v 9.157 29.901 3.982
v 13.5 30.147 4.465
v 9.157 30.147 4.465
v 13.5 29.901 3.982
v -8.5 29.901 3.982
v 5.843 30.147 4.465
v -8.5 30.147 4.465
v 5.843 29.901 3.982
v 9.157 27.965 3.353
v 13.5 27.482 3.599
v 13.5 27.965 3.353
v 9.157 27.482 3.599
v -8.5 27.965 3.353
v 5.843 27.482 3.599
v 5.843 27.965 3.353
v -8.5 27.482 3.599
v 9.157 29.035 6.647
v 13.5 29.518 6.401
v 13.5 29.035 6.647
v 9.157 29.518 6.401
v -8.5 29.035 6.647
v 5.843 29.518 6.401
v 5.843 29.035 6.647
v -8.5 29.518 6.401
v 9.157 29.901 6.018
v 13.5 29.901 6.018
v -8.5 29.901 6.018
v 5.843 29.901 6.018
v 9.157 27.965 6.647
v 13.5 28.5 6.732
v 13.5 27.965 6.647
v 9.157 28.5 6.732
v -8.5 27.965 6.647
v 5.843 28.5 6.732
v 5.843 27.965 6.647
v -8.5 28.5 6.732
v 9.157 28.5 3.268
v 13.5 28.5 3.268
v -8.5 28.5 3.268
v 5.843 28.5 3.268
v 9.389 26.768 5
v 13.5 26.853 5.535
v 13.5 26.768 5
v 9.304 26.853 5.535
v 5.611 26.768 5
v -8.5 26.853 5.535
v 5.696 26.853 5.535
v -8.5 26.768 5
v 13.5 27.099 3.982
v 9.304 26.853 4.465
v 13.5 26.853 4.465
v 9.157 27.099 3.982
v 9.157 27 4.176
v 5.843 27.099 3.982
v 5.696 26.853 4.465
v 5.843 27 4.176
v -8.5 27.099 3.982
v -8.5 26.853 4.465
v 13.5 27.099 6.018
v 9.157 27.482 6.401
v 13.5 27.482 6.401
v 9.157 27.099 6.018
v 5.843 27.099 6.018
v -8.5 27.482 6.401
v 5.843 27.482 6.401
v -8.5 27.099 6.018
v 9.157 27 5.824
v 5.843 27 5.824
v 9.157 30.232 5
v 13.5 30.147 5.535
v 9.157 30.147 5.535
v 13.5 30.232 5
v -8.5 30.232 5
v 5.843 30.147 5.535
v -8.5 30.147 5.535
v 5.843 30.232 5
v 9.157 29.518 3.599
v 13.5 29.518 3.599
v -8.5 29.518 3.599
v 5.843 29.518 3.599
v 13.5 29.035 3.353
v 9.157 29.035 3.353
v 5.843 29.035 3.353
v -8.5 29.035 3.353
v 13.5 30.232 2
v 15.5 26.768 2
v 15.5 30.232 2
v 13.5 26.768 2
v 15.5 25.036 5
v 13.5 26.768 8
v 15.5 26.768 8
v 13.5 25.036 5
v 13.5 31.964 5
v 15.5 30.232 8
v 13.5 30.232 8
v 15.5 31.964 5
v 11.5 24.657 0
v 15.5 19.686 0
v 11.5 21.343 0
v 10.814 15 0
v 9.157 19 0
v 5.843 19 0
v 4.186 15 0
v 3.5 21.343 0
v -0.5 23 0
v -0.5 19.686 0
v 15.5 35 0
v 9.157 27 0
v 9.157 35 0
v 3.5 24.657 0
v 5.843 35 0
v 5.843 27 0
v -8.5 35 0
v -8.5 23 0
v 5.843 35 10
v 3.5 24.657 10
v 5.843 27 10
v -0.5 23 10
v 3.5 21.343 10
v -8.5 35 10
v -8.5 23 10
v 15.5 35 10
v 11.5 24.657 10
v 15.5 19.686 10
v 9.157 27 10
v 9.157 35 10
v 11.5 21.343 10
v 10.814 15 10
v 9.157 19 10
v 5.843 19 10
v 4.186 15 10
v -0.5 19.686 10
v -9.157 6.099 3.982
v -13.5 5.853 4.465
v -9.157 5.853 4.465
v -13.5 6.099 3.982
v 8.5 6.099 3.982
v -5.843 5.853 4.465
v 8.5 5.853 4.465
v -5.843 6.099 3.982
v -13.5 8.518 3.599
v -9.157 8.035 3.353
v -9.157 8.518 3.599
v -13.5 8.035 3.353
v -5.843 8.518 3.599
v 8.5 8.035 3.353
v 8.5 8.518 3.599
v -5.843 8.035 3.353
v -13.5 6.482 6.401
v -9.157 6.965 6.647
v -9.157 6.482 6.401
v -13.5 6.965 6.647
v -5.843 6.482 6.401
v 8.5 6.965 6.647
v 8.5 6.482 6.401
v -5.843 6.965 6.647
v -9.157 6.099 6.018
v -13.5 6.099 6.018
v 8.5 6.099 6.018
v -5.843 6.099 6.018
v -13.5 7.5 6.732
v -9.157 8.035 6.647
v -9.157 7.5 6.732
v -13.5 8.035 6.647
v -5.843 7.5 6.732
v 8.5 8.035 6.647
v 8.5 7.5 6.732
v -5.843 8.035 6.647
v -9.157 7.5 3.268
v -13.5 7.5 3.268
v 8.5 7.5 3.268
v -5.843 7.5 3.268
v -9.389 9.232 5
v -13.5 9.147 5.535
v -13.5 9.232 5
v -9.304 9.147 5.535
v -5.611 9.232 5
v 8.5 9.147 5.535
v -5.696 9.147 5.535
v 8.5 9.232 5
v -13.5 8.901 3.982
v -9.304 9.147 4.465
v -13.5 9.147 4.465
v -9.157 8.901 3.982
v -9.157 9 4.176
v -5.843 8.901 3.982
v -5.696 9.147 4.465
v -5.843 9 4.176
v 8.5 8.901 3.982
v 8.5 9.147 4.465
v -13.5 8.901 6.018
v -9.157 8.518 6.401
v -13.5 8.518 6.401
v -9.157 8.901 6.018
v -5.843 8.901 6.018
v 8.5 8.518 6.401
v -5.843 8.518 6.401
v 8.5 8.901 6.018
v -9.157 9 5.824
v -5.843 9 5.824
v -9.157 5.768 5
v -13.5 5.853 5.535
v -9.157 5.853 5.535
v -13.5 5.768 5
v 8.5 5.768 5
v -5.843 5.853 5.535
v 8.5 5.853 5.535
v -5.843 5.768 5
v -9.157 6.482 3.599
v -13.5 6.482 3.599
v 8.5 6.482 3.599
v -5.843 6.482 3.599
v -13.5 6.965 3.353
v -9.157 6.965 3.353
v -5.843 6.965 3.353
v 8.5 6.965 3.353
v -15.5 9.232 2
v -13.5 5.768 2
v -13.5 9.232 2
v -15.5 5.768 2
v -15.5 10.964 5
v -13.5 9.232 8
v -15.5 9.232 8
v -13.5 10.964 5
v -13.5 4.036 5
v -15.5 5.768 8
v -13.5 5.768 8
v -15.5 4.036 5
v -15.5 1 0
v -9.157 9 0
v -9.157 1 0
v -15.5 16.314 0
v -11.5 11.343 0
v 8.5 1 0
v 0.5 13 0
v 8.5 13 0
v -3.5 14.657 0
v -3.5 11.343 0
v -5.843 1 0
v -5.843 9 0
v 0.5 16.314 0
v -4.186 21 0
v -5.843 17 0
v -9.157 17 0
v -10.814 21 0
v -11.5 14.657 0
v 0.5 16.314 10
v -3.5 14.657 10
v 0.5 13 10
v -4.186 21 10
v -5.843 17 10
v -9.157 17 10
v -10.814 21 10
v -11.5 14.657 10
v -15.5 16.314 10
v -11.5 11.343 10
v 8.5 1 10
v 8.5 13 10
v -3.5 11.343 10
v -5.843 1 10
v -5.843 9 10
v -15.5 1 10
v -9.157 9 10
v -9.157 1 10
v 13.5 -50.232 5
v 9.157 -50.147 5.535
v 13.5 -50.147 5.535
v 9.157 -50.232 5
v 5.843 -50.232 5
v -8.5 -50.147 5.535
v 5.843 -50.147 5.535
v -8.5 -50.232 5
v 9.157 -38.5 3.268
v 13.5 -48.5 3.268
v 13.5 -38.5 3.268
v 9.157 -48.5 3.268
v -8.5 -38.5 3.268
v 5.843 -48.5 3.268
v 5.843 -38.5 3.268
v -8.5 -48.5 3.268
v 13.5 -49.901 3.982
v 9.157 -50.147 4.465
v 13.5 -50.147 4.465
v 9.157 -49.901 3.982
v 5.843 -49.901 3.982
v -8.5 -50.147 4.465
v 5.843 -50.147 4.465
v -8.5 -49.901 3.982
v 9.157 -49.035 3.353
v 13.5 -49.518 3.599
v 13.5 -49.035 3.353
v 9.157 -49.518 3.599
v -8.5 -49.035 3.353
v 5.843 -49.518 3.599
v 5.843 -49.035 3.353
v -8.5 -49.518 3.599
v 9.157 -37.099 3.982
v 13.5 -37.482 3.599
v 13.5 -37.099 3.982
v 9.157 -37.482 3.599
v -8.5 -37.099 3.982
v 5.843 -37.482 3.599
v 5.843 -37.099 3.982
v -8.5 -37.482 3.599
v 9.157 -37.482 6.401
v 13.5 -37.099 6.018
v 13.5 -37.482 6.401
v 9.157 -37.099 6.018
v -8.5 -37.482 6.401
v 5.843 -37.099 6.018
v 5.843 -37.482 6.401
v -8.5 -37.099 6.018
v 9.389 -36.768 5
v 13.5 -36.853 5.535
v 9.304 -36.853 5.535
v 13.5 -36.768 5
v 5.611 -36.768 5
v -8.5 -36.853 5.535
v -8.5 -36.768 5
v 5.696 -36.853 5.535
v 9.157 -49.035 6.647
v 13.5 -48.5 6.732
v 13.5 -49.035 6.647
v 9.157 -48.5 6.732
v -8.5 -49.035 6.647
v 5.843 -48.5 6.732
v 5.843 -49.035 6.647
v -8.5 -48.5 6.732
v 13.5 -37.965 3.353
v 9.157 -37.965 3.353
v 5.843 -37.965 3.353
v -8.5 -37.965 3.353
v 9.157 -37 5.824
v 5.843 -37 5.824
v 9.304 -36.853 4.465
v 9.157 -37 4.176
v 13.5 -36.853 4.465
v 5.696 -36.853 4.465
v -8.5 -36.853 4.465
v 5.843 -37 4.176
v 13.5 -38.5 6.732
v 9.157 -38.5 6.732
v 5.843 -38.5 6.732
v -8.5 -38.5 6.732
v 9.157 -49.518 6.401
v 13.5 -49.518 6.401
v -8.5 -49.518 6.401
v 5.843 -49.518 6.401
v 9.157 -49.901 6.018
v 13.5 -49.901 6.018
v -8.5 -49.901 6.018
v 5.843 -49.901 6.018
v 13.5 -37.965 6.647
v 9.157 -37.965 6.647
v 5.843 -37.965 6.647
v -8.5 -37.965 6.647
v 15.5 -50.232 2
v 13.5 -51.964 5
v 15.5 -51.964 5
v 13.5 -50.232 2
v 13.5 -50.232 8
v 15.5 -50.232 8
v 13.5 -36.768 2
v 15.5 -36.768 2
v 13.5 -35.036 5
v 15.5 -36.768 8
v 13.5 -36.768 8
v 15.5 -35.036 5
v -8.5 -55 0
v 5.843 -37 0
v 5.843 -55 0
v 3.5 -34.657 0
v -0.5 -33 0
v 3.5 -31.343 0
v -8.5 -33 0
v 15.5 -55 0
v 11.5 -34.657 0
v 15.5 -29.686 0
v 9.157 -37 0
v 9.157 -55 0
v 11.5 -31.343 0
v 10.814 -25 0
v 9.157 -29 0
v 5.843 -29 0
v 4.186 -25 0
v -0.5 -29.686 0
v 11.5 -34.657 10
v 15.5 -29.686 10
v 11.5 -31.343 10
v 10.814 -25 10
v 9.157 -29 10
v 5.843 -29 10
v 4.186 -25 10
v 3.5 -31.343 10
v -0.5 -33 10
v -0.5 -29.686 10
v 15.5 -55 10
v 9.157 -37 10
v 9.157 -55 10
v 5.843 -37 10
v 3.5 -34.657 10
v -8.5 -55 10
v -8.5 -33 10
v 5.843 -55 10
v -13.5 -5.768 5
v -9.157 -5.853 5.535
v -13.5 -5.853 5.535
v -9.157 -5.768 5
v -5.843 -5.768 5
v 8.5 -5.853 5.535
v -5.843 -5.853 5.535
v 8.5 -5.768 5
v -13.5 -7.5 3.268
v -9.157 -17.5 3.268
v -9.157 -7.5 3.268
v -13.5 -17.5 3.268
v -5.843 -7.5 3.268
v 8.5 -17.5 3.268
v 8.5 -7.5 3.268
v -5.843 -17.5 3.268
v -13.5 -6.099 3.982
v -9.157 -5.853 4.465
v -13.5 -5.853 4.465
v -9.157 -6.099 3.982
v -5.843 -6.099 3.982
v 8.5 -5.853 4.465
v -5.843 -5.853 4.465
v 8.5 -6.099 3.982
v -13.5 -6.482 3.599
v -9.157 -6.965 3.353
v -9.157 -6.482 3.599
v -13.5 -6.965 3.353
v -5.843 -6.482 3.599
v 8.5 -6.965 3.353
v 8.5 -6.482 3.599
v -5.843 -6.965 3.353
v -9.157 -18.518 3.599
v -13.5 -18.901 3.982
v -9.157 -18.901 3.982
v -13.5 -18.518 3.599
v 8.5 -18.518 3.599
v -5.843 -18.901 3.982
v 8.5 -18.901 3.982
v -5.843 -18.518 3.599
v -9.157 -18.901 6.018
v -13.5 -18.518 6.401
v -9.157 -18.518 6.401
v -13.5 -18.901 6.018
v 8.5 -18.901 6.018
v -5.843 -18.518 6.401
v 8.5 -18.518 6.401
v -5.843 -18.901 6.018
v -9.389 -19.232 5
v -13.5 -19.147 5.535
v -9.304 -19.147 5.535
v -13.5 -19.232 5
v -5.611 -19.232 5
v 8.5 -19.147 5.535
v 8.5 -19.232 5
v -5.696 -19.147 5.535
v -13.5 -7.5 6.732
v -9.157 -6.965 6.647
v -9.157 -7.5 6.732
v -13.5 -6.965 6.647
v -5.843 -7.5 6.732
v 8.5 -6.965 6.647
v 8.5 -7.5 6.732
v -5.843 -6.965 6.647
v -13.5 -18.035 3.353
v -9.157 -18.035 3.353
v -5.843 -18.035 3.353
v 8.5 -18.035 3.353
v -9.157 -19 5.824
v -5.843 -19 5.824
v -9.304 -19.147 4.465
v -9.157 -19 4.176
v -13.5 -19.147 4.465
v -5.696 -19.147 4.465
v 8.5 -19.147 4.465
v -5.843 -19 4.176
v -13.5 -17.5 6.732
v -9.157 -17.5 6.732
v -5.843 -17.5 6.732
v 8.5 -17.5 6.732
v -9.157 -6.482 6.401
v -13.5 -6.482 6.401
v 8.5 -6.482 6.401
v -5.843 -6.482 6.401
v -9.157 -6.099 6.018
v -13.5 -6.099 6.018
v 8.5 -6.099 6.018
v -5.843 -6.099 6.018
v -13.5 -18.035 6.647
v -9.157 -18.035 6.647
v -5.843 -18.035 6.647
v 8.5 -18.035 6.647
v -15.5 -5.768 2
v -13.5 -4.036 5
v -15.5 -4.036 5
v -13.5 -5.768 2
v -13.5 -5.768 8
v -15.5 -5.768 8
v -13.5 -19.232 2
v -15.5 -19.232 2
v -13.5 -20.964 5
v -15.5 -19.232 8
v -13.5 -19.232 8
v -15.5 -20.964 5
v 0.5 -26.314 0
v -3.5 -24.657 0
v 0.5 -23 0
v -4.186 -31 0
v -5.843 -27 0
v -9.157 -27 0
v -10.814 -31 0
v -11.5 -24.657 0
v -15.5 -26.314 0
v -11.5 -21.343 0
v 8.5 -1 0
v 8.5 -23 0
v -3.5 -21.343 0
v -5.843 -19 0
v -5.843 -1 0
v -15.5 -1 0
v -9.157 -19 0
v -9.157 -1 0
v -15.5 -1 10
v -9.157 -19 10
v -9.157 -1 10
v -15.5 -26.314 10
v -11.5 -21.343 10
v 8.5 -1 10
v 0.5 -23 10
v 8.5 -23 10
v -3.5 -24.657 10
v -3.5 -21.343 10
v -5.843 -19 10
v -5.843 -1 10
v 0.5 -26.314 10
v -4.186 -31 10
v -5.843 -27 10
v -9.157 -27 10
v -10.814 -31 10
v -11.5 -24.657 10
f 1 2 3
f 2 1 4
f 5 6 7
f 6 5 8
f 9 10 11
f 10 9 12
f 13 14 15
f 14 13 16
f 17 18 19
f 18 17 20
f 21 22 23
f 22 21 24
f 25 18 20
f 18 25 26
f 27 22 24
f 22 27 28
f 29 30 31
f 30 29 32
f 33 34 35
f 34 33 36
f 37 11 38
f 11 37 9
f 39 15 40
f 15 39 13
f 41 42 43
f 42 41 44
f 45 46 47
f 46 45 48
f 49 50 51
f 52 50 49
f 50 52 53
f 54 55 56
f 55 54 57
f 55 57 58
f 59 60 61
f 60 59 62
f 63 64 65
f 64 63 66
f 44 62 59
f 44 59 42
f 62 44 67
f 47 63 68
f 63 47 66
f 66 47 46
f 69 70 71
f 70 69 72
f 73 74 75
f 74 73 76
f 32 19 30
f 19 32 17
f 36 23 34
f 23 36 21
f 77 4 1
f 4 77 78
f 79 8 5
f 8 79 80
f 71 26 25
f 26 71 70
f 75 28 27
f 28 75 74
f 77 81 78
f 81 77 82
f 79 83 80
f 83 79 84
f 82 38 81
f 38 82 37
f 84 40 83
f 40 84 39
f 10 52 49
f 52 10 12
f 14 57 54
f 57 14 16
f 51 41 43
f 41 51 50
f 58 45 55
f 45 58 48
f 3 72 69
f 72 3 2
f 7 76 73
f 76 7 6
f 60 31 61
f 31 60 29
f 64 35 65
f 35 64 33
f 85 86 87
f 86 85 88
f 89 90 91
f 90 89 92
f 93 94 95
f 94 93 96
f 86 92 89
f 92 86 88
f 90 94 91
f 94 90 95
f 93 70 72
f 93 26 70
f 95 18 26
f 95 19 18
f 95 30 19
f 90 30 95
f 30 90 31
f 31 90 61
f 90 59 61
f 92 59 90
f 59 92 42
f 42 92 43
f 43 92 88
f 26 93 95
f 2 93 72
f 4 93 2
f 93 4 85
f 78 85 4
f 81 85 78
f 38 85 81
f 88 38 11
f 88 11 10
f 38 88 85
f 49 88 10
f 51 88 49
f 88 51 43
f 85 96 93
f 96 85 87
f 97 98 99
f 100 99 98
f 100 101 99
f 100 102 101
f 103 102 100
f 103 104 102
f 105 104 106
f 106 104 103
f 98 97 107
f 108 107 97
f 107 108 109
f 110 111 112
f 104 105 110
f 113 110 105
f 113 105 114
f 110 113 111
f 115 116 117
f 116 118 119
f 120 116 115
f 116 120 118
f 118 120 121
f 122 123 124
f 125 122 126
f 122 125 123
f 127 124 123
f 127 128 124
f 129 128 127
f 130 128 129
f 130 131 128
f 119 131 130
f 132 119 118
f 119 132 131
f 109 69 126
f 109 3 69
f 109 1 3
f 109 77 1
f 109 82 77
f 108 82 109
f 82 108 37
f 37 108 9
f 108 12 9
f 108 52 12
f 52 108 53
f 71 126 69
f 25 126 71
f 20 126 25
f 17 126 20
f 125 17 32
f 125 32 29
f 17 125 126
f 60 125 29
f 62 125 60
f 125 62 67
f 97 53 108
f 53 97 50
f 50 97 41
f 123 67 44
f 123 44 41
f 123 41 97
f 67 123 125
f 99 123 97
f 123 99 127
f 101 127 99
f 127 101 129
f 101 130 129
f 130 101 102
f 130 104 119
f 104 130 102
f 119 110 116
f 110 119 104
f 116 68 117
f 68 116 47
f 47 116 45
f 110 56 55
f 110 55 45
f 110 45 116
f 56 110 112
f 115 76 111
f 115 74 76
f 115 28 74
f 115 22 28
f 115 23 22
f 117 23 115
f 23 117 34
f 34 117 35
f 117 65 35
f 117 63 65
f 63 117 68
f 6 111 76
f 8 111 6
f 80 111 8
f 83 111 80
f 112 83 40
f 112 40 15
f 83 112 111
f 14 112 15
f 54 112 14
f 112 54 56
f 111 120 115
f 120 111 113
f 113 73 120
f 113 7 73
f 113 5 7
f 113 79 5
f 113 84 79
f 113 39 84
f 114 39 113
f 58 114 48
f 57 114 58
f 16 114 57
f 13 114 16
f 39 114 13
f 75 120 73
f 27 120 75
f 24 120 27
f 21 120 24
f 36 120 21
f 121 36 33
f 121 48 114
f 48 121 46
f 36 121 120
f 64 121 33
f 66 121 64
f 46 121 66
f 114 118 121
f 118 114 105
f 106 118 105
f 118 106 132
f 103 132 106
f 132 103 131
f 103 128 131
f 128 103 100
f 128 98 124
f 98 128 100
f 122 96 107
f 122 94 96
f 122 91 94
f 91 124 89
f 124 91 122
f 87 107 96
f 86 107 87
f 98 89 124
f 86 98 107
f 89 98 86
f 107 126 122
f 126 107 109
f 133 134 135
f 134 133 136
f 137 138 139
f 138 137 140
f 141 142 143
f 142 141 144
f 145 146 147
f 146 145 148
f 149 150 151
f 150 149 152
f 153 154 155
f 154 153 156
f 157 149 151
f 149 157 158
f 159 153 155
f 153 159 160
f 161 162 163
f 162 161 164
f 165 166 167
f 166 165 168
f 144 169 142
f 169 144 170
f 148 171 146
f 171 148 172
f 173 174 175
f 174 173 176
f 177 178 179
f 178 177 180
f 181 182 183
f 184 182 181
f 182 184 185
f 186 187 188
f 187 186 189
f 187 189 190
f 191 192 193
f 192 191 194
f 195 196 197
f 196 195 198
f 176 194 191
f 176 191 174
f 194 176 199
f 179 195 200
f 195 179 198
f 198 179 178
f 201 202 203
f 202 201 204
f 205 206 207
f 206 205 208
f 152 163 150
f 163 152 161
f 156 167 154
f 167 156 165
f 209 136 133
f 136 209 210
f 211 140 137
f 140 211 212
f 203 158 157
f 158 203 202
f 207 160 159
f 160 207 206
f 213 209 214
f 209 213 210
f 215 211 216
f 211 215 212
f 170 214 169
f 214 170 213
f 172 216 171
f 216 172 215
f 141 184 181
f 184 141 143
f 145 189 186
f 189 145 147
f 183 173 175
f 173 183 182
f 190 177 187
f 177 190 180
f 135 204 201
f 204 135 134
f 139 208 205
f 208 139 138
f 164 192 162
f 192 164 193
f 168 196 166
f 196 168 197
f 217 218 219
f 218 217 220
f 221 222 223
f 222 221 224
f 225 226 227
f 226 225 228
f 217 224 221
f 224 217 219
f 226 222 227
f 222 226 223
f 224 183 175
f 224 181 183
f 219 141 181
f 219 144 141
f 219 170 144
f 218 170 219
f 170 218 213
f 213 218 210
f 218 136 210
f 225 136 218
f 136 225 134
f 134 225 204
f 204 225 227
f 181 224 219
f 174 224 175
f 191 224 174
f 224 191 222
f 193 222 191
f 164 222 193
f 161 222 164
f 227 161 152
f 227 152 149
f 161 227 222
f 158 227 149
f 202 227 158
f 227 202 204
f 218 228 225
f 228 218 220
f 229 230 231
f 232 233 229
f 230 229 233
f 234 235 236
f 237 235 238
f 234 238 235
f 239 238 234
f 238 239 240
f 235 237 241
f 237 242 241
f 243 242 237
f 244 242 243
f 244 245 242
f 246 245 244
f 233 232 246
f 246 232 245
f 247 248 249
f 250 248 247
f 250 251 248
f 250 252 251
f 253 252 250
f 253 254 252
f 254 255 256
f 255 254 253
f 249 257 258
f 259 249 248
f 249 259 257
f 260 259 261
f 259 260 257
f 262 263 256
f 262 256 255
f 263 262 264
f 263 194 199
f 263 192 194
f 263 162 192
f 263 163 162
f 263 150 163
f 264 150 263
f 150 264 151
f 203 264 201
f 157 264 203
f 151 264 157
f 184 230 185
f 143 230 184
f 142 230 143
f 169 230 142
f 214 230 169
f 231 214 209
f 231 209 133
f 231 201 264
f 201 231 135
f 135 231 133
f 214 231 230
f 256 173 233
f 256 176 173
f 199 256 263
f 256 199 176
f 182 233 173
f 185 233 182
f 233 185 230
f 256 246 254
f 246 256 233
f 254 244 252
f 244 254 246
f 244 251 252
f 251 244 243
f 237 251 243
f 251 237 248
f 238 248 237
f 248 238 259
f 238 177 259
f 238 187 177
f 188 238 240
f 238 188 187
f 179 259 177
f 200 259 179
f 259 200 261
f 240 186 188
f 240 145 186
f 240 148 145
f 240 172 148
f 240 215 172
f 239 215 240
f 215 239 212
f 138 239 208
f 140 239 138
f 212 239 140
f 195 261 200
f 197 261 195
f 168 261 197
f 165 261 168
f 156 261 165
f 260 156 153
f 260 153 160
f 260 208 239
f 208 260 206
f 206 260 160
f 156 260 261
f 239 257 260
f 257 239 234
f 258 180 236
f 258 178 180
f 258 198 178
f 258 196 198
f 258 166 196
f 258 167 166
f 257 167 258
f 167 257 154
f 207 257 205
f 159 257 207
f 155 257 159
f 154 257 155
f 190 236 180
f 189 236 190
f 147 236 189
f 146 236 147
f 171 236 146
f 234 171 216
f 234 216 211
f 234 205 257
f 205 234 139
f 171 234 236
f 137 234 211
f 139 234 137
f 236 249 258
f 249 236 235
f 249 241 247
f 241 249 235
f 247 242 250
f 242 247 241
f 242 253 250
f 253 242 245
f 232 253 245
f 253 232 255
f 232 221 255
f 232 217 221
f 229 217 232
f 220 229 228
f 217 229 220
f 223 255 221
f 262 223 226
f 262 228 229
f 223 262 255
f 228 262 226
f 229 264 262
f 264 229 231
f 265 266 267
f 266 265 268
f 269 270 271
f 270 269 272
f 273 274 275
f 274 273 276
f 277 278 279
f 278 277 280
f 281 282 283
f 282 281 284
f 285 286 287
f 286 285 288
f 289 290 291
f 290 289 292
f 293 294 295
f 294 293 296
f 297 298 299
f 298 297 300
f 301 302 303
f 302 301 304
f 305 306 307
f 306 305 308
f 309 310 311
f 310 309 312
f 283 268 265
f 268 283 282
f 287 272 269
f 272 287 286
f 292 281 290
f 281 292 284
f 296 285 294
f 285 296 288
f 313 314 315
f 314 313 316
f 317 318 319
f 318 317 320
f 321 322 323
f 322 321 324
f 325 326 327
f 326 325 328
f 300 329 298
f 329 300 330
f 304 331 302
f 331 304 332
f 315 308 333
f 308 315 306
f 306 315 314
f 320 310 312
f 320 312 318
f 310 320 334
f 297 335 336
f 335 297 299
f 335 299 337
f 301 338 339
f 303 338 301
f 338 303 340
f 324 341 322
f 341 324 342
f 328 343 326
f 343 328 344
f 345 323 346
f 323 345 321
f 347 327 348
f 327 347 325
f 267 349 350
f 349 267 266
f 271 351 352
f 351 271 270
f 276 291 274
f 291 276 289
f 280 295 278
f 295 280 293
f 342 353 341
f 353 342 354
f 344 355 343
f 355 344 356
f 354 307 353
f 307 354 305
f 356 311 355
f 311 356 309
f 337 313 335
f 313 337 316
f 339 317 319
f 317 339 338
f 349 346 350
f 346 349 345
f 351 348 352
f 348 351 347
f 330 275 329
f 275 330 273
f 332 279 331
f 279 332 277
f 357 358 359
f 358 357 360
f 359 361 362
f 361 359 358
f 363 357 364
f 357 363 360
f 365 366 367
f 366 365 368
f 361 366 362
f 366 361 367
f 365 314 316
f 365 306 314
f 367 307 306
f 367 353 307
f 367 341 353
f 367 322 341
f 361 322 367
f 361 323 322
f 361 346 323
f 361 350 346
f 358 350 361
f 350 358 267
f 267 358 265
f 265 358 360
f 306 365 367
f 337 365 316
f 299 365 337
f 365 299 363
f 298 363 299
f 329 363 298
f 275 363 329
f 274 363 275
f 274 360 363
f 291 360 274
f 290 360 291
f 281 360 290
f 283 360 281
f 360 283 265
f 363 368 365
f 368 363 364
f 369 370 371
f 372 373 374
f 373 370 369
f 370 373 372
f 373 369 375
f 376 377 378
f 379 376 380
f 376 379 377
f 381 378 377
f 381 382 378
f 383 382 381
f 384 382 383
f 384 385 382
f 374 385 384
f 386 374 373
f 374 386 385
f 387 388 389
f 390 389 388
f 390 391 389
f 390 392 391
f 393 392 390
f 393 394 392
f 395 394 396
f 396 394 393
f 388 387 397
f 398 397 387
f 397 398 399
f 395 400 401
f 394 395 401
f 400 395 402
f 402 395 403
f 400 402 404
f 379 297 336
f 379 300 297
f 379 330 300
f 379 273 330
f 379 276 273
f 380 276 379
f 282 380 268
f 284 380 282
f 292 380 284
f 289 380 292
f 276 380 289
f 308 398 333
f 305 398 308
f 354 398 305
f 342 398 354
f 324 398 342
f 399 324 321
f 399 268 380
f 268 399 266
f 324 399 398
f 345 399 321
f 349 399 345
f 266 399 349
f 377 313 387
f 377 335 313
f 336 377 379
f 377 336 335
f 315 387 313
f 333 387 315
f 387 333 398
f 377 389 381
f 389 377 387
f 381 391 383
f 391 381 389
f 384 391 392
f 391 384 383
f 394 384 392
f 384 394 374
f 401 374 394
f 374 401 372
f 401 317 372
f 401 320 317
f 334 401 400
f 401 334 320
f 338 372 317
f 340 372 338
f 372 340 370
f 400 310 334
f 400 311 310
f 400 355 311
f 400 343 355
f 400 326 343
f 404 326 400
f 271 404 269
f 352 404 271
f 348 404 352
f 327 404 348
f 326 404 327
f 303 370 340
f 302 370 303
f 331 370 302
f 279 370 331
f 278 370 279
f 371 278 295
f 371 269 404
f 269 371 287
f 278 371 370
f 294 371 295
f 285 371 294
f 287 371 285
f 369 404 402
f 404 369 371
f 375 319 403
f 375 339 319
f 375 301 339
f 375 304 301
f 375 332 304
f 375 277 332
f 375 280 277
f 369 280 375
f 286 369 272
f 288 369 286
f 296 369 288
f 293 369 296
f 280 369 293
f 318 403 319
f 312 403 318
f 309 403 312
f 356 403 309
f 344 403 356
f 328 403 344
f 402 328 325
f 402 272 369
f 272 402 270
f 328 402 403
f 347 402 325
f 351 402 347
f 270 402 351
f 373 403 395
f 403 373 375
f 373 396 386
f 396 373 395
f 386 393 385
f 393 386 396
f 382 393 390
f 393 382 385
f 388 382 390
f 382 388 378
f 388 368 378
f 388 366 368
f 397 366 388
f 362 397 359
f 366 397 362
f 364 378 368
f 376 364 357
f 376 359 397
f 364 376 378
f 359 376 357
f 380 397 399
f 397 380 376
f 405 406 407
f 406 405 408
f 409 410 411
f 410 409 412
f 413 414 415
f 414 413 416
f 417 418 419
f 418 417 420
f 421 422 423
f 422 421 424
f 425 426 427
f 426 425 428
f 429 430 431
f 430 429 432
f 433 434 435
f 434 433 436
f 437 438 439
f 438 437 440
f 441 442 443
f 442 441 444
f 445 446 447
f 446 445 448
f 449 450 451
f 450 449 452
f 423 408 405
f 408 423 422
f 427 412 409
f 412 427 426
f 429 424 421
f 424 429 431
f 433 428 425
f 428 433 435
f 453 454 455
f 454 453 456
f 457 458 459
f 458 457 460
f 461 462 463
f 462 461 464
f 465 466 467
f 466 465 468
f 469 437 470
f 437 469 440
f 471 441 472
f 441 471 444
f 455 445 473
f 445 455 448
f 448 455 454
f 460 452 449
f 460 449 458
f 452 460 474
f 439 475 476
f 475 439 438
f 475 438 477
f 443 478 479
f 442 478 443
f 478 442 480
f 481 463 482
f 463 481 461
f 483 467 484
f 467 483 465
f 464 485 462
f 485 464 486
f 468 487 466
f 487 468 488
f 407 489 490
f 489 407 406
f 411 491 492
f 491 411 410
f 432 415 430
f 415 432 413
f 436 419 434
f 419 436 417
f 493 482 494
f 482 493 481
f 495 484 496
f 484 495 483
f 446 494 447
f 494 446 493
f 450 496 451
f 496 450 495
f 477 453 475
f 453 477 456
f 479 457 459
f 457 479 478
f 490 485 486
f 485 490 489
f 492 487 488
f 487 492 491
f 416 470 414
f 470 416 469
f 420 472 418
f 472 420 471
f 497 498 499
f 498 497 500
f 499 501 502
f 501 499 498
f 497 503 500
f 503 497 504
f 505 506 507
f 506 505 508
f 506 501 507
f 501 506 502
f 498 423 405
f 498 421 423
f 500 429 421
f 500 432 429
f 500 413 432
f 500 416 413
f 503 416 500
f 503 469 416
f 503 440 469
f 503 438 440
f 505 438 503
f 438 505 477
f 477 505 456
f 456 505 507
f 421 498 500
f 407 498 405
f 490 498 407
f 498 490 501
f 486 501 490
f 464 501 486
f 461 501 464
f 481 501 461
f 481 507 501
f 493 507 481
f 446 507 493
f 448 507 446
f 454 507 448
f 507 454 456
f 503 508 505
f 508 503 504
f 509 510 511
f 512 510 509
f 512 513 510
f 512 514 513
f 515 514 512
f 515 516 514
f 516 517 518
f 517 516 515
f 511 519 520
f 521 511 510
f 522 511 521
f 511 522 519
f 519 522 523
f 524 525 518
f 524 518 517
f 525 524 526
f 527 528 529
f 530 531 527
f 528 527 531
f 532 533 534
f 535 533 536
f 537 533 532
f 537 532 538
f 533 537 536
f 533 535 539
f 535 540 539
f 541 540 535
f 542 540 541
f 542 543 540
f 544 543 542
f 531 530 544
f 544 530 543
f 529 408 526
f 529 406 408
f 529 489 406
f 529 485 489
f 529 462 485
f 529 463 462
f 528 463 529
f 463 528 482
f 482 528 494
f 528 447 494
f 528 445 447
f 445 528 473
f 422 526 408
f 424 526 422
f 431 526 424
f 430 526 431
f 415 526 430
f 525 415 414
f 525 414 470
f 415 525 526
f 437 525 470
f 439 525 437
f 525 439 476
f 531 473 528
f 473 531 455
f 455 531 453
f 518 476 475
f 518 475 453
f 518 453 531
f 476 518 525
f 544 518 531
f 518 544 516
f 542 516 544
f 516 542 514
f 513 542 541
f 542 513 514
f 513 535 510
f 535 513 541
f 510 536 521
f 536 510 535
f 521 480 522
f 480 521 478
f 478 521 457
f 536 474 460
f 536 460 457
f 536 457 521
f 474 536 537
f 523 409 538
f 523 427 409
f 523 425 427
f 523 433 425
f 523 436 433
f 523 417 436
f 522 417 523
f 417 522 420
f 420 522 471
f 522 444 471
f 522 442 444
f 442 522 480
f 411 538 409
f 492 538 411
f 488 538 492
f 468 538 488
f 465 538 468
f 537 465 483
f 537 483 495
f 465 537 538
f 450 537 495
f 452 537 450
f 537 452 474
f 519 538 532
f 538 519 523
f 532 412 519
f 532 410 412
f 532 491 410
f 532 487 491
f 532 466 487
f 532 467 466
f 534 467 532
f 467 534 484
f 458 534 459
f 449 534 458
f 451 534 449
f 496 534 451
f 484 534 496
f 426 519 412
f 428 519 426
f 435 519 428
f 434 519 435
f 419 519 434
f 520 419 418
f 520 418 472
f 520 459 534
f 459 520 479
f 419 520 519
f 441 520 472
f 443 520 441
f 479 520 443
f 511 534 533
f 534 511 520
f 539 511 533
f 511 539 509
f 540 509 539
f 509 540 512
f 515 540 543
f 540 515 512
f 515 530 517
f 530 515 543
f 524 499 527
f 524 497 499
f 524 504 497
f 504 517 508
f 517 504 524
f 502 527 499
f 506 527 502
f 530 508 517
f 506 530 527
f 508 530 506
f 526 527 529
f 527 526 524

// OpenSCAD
include <wallace2.scad>;


module bed_mount(width) difference() {
	linear_extrude(height = 10, convexity = 5) difference() {
		union() {
			rotate(180 / 8) circle((rod_size + 8) * da8, $fn = 8);
			translate([0, -rod_size / 2 - 4, 0]) square([rod_size / 2 + 8+width, max(rod_size + 8, rod_size / 2 + 4 + bed_mount_height)]);
		}
		rotate(180 / 8) circle(rod_size * da8, $fn = 8);
		translate([0, -rod_size / (1 + sqrt(2)) / 2, 0]) square([rod_size + 10 + width, rod_size / (1 + sqrt(2))]);
	}
	translate([rod_size / 2 + 1.5, -rod_size / 2 - 6, 5]) rotate([-90, 0, 0]) {
		hull(){
			cylinder(r = m3_size * da6, h = max(rod_size + 12, rod_size / 2 + 7 + bed_mount_height, $fn = 6));
			translate([width,0,0]) #cylinder(r = m3_size * da6, h = max(rod_size + 12, rod_size / 2 + 7 + bed_mount_height, $fn = 6));
		}
		hull(){
			cylinder(r = m3_nut_size * da6, h = 4, $fn = 6);
			translate([width,0,0])  #cylinder(r = m3_nut_size * da6, h = 4, $fn = 6);
		}
	}
}

!for(b = [0:1]) mirror([0, b, 0]) for(a = [-1,1]) translate([a * -7.5, 18 + 10*b - 5 * a, 0]) rotate(180 + 90 * a) bed_mount(b*10);
